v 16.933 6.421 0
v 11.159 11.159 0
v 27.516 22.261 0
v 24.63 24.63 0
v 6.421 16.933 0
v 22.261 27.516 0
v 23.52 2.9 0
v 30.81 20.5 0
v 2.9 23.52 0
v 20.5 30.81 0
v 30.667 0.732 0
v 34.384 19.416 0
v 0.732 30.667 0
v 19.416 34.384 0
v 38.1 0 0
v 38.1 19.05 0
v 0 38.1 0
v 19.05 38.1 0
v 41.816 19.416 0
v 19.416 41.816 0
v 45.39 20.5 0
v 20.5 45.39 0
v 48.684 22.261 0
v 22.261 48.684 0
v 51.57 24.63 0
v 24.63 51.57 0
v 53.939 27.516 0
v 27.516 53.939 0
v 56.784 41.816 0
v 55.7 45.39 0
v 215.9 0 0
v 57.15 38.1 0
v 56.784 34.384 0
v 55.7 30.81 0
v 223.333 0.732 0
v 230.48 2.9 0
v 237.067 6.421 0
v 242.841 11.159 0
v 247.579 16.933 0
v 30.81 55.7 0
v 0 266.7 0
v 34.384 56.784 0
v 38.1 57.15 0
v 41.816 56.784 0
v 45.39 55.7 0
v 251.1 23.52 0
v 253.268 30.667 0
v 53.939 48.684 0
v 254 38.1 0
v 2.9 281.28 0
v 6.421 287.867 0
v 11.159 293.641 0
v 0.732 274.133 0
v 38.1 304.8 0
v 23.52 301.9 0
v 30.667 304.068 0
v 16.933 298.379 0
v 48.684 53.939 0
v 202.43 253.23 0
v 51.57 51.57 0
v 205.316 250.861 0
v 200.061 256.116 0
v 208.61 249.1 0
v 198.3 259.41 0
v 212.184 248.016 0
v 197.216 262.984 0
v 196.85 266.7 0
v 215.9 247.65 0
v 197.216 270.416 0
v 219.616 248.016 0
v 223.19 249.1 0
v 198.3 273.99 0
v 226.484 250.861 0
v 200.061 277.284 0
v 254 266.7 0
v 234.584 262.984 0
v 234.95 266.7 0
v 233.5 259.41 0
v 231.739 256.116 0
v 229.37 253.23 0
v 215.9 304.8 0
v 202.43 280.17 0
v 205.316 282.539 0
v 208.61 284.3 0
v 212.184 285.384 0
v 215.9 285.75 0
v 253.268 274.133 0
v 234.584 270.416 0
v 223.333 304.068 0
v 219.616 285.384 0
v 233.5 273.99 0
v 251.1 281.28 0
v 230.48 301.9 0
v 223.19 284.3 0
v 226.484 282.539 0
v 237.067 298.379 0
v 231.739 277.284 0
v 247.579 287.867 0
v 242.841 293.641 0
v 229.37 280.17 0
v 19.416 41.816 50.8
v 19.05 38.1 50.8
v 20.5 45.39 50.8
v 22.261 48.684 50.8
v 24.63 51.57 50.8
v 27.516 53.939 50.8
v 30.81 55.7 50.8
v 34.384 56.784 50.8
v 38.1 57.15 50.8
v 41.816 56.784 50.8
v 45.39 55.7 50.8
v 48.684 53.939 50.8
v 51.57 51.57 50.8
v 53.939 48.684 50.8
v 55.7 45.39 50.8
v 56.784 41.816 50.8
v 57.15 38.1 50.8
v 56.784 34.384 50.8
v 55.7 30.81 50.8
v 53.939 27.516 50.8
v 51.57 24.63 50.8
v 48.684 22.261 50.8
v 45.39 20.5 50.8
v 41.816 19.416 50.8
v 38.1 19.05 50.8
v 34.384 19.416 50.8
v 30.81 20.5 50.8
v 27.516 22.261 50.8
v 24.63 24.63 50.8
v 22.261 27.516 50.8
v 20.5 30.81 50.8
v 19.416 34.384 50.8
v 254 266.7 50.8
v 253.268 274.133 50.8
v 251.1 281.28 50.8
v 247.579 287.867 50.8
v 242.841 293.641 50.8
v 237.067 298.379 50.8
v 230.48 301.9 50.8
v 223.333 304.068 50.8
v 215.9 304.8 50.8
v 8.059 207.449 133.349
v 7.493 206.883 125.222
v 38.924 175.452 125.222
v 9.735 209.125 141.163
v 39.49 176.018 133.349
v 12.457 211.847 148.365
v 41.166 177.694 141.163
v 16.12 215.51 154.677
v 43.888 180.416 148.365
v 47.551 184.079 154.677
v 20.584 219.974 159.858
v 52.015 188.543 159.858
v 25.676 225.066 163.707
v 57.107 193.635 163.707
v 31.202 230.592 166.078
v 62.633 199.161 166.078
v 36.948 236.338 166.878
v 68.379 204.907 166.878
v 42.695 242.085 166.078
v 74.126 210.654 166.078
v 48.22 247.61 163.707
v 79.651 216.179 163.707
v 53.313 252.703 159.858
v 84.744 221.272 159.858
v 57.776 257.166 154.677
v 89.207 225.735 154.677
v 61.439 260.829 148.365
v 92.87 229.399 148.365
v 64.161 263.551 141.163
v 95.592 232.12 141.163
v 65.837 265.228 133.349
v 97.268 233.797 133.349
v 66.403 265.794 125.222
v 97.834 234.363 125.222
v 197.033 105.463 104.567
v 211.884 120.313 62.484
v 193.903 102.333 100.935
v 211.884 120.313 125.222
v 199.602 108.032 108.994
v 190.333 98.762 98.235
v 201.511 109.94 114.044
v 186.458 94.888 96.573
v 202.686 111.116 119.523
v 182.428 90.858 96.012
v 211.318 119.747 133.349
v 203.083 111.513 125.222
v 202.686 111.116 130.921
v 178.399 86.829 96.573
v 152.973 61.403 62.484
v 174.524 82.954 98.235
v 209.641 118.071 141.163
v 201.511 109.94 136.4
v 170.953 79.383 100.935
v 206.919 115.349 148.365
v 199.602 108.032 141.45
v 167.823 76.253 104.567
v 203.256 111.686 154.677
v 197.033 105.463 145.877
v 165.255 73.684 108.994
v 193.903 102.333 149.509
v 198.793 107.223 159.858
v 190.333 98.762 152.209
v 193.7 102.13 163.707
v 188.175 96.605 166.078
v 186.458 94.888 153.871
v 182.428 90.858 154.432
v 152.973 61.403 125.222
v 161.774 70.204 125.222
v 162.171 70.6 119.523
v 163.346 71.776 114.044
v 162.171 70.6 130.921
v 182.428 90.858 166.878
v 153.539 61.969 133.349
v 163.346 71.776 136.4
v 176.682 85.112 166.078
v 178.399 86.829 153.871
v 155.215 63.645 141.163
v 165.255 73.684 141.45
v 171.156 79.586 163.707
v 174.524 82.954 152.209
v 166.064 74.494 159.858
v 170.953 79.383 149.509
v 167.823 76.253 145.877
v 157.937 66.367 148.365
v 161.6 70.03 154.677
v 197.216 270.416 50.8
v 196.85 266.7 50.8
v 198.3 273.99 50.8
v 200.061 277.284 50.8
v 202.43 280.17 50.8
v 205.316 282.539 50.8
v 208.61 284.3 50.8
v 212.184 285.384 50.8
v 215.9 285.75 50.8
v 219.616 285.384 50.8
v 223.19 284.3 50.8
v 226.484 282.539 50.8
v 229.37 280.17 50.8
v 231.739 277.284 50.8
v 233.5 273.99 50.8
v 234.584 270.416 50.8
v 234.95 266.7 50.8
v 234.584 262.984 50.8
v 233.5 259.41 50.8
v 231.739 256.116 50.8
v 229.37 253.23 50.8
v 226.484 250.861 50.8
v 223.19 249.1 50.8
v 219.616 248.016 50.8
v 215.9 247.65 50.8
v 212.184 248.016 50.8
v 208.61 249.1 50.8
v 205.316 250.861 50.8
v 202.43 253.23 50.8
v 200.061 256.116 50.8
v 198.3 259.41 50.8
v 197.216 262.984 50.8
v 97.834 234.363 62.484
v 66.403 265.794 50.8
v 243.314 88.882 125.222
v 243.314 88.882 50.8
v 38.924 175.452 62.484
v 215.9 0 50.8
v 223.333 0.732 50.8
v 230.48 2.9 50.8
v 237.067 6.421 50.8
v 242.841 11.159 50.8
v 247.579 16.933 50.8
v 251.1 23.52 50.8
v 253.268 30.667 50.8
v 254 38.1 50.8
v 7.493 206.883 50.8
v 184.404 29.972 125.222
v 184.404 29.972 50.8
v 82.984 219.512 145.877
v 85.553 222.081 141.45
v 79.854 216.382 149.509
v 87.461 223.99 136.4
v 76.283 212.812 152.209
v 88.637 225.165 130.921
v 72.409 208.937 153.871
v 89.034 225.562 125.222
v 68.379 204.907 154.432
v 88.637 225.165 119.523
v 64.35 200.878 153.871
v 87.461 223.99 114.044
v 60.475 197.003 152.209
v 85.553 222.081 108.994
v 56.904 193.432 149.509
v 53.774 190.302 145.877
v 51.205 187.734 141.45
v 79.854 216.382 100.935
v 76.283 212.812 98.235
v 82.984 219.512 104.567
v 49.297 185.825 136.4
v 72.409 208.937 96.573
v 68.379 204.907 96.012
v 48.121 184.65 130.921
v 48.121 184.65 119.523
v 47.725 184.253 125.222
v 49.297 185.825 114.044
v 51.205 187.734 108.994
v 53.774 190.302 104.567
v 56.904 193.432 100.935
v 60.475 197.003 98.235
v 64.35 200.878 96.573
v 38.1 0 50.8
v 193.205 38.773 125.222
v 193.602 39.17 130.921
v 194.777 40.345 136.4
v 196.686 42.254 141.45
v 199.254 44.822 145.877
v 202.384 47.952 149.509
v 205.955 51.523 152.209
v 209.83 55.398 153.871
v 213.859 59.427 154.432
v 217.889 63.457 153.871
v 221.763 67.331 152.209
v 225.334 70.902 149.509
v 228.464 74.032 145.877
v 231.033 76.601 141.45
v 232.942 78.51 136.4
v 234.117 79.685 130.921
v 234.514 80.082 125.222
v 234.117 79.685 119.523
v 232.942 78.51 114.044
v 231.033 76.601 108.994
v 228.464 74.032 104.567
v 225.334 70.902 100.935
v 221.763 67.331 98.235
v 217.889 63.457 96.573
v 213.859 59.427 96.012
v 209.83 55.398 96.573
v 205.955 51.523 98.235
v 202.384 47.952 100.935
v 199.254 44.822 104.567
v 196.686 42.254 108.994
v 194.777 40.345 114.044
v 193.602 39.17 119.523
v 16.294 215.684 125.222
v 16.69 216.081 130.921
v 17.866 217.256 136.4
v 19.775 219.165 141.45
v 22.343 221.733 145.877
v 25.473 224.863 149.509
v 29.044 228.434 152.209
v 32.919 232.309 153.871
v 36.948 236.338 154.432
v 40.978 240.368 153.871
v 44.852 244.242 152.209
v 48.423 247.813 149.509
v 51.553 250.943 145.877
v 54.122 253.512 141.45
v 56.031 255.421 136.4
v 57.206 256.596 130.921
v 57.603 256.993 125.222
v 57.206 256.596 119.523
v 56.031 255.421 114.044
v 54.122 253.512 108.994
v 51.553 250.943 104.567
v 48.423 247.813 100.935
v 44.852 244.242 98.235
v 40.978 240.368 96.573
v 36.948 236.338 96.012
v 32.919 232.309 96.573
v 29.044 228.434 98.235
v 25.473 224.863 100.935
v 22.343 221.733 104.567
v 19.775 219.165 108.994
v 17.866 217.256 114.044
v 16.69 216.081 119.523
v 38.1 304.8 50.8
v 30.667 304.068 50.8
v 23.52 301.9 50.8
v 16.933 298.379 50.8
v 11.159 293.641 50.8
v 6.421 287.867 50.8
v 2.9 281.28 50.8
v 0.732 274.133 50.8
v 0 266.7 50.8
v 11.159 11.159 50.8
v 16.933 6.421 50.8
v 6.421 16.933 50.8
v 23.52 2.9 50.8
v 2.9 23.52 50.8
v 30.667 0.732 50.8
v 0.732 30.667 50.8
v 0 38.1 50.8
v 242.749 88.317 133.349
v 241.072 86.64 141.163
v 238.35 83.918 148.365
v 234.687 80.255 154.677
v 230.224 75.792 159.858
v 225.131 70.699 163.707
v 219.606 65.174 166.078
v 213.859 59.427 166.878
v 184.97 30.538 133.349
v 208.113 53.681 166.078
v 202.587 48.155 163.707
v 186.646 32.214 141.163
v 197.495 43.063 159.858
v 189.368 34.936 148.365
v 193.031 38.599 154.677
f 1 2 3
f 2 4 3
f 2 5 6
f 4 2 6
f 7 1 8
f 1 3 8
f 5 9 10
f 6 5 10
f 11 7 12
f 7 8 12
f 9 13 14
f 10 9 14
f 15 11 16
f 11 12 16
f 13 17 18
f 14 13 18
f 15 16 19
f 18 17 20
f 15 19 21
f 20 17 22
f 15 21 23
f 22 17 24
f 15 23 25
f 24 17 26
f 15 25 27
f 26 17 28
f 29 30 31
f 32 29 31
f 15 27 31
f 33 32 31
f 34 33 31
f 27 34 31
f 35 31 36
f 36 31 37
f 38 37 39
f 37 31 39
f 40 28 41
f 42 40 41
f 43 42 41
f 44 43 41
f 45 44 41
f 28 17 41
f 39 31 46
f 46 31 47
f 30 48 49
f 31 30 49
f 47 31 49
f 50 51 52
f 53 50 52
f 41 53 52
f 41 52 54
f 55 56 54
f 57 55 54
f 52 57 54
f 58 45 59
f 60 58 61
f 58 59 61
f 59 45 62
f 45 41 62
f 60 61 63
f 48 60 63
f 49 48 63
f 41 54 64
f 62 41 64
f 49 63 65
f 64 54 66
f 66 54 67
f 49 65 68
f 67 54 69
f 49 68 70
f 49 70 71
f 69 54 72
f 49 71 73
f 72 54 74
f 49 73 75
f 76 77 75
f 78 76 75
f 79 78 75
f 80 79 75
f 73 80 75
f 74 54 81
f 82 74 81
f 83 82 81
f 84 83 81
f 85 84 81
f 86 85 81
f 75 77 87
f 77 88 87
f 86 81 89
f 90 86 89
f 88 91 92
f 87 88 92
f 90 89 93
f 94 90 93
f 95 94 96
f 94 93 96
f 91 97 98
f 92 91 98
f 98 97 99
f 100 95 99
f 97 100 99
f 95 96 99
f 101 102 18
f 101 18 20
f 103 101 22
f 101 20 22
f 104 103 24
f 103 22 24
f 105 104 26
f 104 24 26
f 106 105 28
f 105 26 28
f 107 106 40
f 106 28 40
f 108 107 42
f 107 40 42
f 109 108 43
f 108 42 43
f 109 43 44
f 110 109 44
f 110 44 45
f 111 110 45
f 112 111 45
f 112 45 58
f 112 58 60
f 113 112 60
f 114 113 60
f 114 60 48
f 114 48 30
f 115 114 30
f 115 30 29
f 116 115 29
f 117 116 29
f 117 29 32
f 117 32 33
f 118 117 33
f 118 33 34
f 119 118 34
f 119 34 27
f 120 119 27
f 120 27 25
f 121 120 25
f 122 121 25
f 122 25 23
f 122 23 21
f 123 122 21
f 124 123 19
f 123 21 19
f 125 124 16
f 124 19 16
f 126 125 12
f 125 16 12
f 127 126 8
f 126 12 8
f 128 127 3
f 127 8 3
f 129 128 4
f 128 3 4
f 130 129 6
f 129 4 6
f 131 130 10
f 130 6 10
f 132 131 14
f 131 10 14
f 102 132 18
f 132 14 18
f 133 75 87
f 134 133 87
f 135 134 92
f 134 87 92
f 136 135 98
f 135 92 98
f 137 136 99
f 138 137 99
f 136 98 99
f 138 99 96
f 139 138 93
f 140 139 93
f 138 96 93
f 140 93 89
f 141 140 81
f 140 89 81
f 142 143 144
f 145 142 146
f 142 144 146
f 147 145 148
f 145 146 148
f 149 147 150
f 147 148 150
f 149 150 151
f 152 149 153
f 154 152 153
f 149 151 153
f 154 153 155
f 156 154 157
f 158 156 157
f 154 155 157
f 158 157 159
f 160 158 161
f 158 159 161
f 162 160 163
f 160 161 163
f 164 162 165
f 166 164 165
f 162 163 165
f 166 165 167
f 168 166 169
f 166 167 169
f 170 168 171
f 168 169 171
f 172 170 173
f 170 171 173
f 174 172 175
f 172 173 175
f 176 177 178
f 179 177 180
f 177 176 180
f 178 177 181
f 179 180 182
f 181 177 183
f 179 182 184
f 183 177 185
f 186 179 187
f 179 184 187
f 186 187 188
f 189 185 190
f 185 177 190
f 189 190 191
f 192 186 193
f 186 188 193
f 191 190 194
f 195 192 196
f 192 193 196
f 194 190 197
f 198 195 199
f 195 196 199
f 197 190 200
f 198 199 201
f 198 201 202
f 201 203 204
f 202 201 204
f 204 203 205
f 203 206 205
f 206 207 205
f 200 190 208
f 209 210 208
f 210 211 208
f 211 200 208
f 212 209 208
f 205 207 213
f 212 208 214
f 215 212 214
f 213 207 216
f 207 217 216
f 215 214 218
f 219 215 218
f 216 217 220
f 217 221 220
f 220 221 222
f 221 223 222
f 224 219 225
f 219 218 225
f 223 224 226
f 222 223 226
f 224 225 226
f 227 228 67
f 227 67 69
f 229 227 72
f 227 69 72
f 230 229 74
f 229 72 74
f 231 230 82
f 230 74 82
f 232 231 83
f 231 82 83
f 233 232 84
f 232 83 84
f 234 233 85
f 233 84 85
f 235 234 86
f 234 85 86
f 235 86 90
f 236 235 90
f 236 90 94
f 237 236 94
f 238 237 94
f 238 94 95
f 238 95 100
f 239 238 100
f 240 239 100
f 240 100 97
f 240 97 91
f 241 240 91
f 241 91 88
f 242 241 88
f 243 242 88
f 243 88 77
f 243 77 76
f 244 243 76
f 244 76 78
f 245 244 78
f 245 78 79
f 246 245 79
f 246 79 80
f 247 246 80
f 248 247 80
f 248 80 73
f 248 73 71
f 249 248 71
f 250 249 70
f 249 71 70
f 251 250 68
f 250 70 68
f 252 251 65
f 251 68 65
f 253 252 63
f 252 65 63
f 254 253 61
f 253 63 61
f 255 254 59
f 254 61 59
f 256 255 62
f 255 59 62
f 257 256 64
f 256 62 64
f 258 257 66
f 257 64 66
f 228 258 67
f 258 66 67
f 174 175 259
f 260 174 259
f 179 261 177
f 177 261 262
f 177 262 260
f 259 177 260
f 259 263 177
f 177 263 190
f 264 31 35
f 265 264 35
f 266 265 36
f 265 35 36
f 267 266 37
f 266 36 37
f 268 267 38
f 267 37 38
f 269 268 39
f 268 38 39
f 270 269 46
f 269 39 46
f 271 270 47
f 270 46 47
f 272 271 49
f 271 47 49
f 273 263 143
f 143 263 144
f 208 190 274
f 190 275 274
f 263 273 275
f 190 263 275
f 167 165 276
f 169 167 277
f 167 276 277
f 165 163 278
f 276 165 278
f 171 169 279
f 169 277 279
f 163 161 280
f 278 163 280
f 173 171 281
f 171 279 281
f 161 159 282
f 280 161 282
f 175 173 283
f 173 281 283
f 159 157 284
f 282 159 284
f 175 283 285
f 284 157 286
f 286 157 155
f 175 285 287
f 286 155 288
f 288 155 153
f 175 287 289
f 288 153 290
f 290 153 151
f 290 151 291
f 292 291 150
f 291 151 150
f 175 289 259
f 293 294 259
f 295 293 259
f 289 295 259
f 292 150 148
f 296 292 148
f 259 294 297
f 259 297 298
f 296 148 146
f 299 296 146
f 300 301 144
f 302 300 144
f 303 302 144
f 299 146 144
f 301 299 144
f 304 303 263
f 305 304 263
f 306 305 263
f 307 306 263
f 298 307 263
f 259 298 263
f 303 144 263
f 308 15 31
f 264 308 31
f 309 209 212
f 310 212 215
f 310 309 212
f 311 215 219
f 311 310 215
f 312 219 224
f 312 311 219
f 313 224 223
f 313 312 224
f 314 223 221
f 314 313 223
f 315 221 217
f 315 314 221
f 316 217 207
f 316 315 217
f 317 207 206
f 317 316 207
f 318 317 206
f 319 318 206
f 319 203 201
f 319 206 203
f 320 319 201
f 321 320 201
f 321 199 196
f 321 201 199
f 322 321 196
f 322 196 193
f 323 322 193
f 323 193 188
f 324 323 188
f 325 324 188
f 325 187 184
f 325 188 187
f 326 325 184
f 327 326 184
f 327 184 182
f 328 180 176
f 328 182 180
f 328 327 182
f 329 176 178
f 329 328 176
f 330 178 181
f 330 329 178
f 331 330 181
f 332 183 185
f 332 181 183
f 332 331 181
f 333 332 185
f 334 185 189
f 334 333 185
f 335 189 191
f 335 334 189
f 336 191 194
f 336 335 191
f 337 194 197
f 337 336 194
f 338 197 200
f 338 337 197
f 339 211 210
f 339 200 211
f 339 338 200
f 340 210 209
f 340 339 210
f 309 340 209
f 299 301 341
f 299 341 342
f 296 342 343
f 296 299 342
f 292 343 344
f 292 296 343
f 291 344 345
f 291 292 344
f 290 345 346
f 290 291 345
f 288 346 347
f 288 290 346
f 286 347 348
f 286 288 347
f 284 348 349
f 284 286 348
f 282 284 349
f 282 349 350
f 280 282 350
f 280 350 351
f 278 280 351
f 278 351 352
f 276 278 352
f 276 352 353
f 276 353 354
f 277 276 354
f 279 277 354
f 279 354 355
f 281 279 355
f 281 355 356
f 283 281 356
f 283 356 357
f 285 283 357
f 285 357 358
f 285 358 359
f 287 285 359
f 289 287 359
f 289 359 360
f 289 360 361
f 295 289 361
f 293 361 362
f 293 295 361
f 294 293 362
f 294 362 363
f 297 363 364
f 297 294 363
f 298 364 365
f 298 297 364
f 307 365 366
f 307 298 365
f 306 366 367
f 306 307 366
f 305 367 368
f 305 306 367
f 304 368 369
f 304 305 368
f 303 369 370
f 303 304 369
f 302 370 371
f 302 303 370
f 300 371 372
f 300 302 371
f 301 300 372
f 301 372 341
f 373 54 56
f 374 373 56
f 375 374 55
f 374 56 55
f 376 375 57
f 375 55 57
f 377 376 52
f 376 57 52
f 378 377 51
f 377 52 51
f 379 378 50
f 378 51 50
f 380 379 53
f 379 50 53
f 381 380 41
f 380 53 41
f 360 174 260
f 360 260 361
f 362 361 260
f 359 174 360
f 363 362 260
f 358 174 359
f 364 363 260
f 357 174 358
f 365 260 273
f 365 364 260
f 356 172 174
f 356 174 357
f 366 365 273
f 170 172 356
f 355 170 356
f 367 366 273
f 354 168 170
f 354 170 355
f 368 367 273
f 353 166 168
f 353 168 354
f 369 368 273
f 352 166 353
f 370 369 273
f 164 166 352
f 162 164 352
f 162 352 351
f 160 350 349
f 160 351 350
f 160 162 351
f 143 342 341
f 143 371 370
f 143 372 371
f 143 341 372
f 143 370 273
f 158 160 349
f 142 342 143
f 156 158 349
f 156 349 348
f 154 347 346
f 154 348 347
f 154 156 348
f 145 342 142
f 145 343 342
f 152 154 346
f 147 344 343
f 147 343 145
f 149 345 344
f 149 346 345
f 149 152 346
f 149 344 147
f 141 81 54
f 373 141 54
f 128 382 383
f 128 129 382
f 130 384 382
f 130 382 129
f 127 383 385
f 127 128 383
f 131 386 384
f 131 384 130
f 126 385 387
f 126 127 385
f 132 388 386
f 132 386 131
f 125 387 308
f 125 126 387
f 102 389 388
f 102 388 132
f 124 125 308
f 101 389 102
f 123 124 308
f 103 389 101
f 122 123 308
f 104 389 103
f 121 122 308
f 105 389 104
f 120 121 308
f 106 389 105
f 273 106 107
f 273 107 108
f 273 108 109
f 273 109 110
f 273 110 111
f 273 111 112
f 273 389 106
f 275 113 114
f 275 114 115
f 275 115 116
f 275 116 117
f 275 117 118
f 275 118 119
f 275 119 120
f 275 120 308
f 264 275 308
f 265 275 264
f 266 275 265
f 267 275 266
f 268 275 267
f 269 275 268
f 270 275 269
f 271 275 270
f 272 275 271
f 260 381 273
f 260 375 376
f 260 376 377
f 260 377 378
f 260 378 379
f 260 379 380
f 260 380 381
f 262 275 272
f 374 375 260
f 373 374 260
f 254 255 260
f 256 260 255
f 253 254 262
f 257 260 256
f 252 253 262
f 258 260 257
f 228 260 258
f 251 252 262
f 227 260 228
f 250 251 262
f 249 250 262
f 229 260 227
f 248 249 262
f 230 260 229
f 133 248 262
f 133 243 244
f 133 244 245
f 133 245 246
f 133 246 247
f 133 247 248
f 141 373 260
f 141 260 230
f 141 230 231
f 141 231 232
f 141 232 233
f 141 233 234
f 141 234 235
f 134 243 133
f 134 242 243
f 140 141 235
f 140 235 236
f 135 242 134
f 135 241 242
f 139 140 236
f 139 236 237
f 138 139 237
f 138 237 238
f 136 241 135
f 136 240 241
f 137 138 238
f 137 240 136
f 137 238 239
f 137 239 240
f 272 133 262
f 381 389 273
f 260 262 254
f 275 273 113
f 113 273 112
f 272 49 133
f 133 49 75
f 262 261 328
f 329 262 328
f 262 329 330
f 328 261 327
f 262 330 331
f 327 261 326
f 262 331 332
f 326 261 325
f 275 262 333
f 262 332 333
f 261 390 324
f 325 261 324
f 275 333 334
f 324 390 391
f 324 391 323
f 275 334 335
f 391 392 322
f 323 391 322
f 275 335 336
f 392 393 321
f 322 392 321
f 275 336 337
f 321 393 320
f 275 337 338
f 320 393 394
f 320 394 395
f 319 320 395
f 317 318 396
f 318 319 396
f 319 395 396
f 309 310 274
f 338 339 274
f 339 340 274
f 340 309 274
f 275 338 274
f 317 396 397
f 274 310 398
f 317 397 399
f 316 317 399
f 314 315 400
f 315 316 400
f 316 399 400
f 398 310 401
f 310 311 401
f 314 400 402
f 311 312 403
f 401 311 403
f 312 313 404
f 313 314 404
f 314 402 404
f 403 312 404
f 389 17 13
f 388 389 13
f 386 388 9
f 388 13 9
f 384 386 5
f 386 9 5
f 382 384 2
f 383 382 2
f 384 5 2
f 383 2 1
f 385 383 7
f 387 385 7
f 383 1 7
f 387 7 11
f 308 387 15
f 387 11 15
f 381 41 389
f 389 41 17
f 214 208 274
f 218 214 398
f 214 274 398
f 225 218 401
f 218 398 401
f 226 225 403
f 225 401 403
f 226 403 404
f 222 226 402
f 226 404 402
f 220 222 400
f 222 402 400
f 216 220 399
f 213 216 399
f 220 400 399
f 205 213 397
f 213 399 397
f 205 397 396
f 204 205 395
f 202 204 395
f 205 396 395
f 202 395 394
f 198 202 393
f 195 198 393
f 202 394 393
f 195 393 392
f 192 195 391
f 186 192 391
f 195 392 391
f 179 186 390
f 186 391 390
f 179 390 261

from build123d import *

# Parameters (mm, degrees)
F1_DEPTH = 50.8
F4_R     = 29.21
F5_DEPTH = 250.19
F6_W     = 161.29
F6_H     = 41.656
F6_H_2   = 62.738
F7_DEPTH = 243.5455460034
F8_D     = 38.1


with BuildPart() as f1:
    # F0 (on Top) → F1 (new body)
    with BuildSketch(Plane.XY):
        with BuildLine():
            ThreePointArc((0, 38.1), (11.1592316368, 11.1592316368), (38.1, 0))
            Line((38.1, 0), (215.9, 0))
            ThreePointArc((215.9, 0), (242.8407683632, 11.1592316368), (254, 38.1))
            Line((254, 38.1), (254, 266.7))
            ThreePointArc((254, 266.7), (242.8407683632, 293.6407683632), (215.9, 304.8))
            Line((215.9, 304.8), (38.1, 304.8))
            ThreePointArc((38.1, 304.8), (11.1592316368, 293.6407683632), (0, 266.7))
            Line((0, 266.7), (0, 38.1))
        make_face()
    extrude(amount=F1_DEPTH)

    # F4 (on line) → F5 (join, through all)
    with BuildSketch(Plane(origin=(77.216, -77.216, 0), x_dir=(-0.7071067812, -0.7071067812, 0), z_dir=(-0.7071067812, 0.7071067812, 0))):
        with BuildLine():
            Line((-234.8987233236, 125.222), (-234.8987233236, 50.8))
            Line((-234.8987233236, 50.8), (-151.5867233236, 50.8))
            Line((-151.5867233236, 50.8), (-151.5867233236, 125.222))
            ThreePointArc((-151.5867233236, 125.222), (-193.2427233236, 166.878), (-234.8987233236, 125.222))
        make_face()
        with Locations((-193.2427233236, 125.222)):
            Circle(F4_R, mode=Mode.SUBTRACT)
    extrude(amount=F5_DEPTH)

    # F6 (on face) → F7 (cut, through all)
    with BuildSketch(Plane(origin=(107.188, 107.188, 0), x_dir=(0.7071067812, -0.7071067812, 0), z_dir=(-0.7071067812, -0.7071067812, 0))):
        with Locations((-15.8950855678, 146.05)):
            Rectangle(F6_W, F6_H)
        with Locations((-15.8950855678, 93.853)):
            Rectangle(F6_W, F6_H_2)
    extrude(amount=-F7_DEPTH, mode=Mode.SUBTRACT)

    # F8 (through all)
    with Locations(Plane.XY.offset(50.8)):
        with Locations((38.1, 38.1), (215.9, 266.7)):
            Hole(F8_D / 2)


solid = f1.part
